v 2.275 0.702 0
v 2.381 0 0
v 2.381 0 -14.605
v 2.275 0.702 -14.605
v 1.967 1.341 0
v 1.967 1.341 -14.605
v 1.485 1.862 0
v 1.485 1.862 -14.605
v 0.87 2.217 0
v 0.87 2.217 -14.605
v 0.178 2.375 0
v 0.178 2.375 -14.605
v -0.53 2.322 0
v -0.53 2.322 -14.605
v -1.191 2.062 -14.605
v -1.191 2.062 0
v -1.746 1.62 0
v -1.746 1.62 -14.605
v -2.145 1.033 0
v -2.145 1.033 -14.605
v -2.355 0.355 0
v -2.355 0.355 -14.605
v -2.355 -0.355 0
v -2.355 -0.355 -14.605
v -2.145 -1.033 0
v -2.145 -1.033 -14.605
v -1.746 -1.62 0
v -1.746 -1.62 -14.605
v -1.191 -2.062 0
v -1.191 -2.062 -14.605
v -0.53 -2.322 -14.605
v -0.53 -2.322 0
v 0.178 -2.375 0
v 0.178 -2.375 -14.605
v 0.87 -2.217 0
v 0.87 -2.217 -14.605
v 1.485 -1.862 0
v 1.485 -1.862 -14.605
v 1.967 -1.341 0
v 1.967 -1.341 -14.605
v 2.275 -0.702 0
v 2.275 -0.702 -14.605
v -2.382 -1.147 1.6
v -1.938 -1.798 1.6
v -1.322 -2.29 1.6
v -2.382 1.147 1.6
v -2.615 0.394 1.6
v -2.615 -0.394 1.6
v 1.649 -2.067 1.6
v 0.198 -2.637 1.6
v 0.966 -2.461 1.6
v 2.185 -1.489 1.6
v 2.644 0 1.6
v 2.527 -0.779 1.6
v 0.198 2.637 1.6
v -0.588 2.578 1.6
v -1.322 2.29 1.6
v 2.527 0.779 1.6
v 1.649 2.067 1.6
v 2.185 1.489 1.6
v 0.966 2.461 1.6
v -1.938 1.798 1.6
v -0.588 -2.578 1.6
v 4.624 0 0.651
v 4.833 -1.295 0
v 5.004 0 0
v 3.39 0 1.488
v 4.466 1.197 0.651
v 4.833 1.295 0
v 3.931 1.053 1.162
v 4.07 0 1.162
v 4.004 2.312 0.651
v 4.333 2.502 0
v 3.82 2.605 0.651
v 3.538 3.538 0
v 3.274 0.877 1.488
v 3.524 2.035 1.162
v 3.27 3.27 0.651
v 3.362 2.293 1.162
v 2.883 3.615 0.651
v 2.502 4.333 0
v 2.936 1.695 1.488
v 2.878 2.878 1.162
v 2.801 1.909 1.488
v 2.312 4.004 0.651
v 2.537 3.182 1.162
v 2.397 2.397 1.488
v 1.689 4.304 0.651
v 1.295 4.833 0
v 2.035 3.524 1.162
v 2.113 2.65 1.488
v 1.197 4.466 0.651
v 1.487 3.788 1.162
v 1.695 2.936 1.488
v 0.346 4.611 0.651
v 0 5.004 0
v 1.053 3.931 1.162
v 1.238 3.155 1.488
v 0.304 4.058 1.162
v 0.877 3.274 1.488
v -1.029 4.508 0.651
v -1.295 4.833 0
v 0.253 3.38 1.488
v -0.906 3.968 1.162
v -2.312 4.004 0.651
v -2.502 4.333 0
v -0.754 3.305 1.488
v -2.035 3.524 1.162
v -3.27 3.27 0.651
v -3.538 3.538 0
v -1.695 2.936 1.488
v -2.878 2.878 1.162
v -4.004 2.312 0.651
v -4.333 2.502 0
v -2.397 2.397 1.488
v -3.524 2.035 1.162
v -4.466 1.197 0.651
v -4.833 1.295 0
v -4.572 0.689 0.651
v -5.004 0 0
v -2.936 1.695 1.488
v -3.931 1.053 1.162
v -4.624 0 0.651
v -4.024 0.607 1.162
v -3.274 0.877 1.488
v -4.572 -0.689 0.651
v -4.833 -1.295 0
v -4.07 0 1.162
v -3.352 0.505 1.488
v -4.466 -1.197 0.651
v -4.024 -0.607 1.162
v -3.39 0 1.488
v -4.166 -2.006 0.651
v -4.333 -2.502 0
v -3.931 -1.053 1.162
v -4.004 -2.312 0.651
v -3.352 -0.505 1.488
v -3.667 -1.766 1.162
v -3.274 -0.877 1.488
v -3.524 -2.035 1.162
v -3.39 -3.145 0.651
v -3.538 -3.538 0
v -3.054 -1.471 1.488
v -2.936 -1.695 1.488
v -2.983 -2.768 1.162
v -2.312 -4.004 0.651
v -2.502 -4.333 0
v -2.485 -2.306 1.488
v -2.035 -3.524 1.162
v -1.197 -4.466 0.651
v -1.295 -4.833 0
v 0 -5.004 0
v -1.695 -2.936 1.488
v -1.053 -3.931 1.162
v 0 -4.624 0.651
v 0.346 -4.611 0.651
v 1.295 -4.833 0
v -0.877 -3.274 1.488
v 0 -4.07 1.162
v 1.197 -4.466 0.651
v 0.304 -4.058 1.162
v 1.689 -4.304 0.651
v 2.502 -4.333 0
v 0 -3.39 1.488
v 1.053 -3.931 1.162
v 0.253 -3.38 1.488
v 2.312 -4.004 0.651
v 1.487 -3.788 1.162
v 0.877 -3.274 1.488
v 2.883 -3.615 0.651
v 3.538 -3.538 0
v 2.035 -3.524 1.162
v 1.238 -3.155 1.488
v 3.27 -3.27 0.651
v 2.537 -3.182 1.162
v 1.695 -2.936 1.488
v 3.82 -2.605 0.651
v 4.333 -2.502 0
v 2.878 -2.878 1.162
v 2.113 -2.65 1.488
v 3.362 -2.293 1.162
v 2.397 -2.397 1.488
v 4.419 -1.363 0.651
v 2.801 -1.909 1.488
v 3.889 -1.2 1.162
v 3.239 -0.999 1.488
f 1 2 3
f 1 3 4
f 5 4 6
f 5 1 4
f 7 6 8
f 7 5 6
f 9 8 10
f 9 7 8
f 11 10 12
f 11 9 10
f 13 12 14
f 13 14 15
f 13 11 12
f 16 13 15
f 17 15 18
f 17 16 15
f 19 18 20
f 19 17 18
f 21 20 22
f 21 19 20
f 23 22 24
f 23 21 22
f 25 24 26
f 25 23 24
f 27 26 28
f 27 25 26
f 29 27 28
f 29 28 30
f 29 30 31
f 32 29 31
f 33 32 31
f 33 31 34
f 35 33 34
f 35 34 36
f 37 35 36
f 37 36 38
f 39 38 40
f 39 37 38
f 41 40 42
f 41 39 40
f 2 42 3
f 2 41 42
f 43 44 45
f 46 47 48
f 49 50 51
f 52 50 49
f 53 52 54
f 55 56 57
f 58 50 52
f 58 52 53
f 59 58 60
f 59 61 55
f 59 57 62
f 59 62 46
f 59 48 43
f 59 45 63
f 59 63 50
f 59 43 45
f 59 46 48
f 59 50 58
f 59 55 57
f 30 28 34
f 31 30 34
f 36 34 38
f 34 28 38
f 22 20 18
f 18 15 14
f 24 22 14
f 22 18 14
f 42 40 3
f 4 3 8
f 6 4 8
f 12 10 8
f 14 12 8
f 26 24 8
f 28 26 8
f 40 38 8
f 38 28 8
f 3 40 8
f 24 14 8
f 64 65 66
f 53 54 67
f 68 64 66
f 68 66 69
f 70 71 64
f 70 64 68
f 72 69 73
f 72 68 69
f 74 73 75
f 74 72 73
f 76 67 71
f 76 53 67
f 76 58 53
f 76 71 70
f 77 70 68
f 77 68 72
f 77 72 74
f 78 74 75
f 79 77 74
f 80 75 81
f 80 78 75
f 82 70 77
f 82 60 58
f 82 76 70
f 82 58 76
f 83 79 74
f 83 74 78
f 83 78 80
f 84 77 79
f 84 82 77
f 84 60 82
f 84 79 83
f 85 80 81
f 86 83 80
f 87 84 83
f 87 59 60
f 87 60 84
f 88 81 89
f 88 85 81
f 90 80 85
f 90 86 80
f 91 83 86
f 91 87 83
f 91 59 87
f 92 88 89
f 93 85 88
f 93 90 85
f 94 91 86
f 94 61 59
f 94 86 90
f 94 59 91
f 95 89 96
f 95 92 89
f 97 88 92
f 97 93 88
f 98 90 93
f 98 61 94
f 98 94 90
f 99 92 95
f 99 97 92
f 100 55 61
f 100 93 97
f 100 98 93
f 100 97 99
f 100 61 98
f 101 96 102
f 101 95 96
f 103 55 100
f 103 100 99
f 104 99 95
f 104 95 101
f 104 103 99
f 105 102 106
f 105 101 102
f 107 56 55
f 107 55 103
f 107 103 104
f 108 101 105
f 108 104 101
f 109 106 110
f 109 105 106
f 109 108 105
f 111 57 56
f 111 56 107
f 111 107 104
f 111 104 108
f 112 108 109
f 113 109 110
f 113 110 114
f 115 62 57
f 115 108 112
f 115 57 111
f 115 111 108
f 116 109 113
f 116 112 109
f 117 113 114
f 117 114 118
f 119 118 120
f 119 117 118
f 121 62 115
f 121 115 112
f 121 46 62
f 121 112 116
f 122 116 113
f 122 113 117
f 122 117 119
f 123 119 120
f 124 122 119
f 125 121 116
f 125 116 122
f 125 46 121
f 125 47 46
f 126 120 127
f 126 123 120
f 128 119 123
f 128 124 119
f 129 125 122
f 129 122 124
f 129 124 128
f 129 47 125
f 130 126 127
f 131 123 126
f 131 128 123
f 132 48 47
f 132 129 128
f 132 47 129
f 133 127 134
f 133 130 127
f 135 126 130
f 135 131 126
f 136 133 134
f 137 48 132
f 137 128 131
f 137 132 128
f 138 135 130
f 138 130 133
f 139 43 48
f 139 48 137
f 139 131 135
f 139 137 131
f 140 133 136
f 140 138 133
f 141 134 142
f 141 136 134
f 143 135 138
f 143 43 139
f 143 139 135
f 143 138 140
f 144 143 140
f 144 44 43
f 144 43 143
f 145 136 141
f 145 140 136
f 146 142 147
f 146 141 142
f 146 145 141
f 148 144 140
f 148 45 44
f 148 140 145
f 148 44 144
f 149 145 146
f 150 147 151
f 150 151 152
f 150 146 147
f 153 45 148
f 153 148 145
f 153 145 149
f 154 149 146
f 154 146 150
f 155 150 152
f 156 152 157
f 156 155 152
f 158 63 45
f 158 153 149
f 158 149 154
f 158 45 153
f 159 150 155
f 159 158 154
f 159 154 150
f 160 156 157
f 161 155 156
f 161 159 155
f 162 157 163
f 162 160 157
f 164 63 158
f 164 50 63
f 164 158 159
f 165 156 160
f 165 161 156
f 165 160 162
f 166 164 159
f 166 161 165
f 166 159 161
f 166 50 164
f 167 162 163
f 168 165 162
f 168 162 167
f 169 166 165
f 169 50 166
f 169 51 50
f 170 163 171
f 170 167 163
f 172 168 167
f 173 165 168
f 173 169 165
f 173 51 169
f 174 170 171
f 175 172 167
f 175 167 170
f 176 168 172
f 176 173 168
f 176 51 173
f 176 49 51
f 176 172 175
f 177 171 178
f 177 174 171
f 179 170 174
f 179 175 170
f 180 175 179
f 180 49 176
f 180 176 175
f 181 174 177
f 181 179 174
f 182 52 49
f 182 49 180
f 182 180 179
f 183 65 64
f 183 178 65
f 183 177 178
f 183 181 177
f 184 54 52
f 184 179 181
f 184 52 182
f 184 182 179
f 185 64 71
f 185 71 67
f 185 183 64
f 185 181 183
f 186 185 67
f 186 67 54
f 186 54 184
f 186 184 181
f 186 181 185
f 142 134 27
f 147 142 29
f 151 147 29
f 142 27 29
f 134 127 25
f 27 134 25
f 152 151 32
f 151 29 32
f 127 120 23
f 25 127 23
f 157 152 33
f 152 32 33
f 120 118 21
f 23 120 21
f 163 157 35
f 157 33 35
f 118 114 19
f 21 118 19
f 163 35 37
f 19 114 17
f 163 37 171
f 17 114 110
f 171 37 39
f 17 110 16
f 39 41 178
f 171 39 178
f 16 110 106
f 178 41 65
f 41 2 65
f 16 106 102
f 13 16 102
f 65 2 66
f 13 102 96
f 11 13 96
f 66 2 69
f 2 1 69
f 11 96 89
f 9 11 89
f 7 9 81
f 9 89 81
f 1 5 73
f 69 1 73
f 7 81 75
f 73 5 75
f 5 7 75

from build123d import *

# Parameters (mm, degrees)
SKETCH1_R           = 5.0038
BOSS_EXTRUDE1_DEPTH = 1.6002
SKETCH2_R           = 2.38125
BOSS_EXTRUDE2_DEPTH = 14.605
FILLET1_R           = 2.54


with BuildPart() as part:
    # Sketch1 → Boss-Extrude1 (new body)
    with BuildSketch(Plane.XY):
        Circle(SKETCH1_R)
    extrude(amount=BOSS_EXTRUDE1_DEPTH)

    # Sketch2 → Boss-Extrude2 (add)
    with BuildSketch(Plane.XY):
        Circle(SKETCH2_R)
    extrude(amount=-BOSS_EXTRUDE2_DEPTH)

    # Fillet1
    # the kernel refuses this fillet: 2.54 mm, written as the material it takes off along each edge
    with BuildSketch(Plane(origin=(0, 0, 1.6002), x_dir=(1, 0, 0), z_dir=(0, -1, 0))) as fillet1_piece_1:
        with BuildLine():
            CenterArc((2.644059345, -2.54), FILLET1_R, 21.715617283, 68.284382717)
            Line((2.644059345, 0), (2.644059345, 0.0508))
            Line((2.644059345, 0.0508), (5.0038, 0.0508))
            Line((5.0038, 0.0508), (5.0546, 0))
            ThreePointArc((5.0546, 0), (5.0546, -0.8001), (5.050994813, -1.581404))
            Line((5.050994813, -1.581404), (5.0038, -1.6002))
        make_face()
    revolve(axis=Axis((0, 0, 1.6002), (0, 0, 1)), mode=Mode.SUBTRACT)


solid = part.part
